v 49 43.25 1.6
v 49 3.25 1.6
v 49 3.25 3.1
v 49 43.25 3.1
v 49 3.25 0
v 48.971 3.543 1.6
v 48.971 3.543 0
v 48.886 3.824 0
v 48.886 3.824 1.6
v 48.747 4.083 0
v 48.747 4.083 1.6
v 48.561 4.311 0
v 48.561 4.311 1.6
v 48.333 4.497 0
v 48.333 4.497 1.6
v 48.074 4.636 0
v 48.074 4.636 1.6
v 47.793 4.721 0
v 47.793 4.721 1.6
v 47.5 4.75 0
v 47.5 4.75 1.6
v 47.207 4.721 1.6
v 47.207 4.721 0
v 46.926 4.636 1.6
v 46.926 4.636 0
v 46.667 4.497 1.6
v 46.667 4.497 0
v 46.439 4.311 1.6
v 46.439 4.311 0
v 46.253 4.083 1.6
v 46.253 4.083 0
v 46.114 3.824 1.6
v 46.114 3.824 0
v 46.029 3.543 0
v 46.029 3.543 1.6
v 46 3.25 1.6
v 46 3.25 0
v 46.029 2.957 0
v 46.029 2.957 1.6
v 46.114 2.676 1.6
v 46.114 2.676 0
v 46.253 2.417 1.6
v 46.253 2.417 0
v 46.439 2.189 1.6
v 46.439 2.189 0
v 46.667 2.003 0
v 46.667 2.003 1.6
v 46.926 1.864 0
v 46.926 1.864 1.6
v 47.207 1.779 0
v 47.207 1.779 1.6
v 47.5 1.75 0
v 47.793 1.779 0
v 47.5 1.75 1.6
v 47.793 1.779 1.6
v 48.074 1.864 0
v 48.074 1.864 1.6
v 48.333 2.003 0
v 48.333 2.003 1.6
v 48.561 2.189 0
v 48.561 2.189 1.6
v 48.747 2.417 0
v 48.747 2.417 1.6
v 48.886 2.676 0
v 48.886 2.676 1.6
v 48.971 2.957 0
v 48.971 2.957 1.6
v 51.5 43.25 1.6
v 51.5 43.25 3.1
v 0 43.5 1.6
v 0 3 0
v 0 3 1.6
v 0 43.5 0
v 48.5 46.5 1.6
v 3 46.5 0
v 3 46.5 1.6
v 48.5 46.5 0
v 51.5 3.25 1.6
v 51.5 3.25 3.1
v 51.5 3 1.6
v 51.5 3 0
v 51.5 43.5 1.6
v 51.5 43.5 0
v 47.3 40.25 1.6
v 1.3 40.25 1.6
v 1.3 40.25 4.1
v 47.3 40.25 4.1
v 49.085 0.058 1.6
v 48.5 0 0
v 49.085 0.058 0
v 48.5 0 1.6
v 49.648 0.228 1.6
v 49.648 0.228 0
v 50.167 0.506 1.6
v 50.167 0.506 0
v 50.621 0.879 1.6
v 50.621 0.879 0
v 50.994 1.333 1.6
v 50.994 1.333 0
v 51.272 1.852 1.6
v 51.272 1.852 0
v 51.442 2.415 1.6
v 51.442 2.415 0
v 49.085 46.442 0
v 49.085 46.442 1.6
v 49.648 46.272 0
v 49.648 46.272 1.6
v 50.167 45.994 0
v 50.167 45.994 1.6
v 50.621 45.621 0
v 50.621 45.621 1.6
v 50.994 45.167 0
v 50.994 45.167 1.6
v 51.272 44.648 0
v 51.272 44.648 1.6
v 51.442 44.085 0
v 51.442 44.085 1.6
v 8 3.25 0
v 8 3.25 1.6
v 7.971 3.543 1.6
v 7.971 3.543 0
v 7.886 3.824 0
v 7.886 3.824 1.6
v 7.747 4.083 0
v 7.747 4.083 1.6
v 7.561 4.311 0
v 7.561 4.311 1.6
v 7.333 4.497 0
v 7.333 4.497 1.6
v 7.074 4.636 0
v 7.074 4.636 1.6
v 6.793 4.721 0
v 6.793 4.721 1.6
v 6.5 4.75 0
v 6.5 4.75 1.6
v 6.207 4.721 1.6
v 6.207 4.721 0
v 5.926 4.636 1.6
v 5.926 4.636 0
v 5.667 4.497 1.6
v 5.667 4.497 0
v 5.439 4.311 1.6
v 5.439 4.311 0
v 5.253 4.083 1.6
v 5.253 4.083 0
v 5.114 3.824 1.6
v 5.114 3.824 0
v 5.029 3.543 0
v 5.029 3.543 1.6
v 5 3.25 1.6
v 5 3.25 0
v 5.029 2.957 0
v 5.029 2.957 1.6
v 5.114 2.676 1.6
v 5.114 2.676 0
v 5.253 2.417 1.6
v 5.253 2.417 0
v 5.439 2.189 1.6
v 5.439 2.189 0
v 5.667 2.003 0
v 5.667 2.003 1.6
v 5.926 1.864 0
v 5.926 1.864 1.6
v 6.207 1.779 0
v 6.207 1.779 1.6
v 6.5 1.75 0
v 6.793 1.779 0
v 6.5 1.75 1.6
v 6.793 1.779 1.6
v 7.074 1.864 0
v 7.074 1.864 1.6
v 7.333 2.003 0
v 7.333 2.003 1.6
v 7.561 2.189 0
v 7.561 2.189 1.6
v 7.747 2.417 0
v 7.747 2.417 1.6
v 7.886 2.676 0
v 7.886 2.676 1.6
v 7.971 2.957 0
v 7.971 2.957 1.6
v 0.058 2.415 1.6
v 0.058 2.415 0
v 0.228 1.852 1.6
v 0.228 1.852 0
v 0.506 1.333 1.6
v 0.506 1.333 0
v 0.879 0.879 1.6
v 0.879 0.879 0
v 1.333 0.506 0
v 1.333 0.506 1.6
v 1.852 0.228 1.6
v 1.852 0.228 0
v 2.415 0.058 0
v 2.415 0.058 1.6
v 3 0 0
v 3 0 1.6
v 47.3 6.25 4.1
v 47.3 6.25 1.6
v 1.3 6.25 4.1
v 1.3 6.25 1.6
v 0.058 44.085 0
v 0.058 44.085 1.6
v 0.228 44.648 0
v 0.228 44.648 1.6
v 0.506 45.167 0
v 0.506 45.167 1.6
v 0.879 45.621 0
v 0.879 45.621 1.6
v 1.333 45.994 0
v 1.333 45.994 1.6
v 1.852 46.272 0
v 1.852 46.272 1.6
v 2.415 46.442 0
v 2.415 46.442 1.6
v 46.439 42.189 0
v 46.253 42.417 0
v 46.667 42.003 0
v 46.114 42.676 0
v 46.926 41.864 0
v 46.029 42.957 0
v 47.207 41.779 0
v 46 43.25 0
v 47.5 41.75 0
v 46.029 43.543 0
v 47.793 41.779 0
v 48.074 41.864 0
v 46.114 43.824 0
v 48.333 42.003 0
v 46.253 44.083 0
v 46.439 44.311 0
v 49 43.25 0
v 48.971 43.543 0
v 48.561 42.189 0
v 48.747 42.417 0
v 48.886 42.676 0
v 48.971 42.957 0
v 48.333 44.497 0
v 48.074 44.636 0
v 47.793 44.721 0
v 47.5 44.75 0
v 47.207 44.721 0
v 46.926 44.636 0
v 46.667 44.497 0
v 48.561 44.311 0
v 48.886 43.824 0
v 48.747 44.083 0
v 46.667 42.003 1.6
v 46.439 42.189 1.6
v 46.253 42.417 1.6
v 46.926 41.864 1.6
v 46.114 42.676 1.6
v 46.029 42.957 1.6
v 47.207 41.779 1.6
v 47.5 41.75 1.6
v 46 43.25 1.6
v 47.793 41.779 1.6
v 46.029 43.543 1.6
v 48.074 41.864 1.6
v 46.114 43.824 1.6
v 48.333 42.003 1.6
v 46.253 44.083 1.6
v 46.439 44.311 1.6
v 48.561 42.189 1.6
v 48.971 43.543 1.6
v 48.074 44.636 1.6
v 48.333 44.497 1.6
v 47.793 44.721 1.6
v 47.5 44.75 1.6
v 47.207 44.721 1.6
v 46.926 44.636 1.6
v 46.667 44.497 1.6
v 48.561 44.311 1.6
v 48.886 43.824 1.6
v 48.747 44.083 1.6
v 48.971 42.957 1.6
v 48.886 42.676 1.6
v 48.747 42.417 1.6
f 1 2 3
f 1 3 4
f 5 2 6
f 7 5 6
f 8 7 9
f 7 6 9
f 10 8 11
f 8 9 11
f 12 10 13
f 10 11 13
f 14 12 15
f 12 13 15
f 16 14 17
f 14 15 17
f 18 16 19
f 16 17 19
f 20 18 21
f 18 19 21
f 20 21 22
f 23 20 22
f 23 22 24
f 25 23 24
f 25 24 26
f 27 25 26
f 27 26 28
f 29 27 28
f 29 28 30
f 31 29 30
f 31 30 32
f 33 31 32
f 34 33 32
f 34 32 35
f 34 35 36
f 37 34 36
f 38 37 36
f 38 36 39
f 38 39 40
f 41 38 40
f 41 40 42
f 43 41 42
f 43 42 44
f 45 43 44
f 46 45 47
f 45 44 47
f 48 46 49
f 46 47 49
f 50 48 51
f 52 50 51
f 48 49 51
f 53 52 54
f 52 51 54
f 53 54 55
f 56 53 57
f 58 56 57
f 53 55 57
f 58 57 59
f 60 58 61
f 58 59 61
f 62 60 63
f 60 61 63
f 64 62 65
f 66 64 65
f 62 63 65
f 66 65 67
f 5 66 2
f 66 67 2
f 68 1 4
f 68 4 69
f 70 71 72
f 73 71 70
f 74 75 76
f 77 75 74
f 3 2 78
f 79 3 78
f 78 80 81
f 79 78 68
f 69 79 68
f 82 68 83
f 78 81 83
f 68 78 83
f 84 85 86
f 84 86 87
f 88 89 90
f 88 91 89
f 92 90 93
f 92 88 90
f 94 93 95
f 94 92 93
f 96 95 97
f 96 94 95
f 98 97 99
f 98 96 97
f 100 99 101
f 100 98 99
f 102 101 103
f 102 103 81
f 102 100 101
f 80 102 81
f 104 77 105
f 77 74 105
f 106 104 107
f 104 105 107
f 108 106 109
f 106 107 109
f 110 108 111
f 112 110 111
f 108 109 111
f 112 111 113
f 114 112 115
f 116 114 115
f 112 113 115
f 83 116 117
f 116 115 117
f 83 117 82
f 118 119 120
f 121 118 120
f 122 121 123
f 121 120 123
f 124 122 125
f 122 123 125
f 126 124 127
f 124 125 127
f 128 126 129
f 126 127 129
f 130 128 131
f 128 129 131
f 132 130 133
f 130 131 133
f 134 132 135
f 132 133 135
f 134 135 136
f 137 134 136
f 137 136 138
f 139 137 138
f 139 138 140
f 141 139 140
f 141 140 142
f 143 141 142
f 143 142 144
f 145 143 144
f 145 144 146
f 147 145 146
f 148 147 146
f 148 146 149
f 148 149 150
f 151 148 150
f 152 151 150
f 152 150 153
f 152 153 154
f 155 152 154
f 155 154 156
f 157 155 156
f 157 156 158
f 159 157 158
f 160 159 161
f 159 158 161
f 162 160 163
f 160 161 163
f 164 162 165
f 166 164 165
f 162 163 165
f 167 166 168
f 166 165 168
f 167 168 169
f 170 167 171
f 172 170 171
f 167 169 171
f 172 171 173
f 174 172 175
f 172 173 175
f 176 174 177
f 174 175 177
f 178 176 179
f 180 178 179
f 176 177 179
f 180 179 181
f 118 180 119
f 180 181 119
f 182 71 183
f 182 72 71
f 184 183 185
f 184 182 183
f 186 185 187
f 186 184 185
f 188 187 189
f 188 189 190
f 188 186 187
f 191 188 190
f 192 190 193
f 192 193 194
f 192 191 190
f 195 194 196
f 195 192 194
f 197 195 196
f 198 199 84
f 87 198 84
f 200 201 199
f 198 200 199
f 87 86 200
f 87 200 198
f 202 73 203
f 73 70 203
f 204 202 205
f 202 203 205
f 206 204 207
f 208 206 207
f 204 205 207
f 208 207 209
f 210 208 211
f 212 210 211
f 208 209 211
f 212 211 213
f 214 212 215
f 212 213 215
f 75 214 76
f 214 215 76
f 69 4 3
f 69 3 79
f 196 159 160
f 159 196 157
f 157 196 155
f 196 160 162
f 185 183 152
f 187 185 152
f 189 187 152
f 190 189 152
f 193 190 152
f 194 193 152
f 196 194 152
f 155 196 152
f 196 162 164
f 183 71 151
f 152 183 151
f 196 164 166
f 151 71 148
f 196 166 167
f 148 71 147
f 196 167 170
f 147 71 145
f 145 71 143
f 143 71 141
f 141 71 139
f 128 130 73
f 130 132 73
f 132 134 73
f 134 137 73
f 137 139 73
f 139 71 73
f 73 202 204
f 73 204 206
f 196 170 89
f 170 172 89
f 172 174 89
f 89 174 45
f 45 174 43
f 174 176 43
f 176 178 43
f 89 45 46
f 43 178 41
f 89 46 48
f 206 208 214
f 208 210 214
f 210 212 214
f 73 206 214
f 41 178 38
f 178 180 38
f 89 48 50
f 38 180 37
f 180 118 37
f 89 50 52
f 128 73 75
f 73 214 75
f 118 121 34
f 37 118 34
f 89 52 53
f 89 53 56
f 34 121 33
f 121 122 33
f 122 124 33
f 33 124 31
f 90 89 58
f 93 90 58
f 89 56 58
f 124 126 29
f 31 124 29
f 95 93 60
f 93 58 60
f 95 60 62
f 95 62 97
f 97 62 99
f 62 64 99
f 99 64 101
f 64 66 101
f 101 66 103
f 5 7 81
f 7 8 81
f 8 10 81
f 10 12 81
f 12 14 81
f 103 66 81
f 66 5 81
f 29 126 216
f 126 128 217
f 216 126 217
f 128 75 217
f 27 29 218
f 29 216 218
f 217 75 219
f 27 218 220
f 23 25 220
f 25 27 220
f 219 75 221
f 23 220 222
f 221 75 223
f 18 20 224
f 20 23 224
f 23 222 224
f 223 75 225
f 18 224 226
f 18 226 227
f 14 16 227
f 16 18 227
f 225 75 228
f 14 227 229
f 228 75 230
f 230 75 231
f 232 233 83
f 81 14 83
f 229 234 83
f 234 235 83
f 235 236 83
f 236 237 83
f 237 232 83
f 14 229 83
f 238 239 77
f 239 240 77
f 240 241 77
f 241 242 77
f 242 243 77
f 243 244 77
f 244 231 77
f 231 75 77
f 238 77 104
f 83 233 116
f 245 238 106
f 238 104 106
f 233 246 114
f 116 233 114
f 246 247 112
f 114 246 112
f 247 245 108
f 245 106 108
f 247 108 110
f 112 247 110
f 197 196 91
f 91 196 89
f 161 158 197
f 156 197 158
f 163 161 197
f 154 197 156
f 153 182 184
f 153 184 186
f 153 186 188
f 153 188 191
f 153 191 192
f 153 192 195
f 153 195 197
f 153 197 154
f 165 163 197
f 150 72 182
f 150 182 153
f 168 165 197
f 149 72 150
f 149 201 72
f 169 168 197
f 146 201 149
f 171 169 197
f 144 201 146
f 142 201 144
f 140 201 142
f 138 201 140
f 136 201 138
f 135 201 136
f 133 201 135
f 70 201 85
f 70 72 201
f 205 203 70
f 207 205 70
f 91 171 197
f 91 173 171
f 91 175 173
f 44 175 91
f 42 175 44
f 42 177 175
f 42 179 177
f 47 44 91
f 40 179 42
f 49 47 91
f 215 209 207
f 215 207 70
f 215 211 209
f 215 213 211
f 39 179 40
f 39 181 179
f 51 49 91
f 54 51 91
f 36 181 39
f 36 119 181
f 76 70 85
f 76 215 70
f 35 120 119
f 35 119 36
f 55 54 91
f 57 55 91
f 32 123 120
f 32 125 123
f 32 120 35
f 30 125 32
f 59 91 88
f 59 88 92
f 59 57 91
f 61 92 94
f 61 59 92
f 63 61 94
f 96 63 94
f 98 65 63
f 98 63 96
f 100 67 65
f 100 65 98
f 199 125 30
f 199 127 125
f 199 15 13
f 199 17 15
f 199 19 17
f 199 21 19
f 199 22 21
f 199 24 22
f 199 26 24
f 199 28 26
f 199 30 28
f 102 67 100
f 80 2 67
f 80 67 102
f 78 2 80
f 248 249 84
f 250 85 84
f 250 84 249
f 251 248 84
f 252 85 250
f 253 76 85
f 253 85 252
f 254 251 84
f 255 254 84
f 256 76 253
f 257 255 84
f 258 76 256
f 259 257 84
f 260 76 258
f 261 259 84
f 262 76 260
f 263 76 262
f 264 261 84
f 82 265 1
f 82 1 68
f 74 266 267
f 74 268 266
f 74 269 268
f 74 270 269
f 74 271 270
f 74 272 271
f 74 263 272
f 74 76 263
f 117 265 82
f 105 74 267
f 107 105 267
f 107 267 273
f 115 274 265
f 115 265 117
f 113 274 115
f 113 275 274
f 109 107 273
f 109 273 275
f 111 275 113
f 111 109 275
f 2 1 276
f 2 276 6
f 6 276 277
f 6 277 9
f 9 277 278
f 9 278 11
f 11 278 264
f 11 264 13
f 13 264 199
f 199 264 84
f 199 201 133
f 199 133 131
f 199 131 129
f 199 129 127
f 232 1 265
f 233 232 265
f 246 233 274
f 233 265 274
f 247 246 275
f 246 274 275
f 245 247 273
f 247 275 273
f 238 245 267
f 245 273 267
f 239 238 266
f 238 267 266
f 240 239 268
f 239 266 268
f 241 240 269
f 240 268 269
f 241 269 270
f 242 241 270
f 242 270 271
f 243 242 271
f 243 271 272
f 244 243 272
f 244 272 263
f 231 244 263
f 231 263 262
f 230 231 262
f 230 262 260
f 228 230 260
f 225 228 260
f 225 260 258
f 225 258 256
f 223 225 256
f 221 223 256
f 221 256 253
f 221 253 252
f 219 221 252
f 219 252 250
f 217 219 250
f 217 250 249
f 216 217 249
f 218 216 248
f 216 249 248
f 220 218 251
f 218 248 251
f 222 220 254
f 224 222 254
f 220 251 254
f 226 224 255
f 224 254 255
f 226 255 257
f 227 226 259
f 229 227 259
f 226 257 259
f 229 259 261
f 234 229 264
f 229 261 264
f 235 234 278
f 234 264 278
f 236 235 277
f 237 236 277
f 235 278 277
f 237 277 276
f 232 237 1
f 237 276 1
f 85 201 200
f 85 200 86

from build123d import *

# Parameters (mm, degrees)
ESQUISSE1_W             = 51.5
ESQUISSE1_H             = 46.5
BOSS_EXTRU_1_DEPTH      = 1.6
ESQUISSE2_W             = 46
ESQUISSE2_H             = 34
BOSS_EXTRU_2_DEPTH      = 2.5
ESQUISSE3_W             = 2.5
ESQUISSE3_H             = 40
BOSS_EXTRU_3_DEPTH      = 1.5
ESQUISSE4_R             = 1.5
ENL_V_MAT_EXTRU_1_DEPTH = 70.431621038
CONG_1_R                = 3


with BuildPart() as part:
    # Esquisse1 → Boss.-Extru.1 (new body)
    with BuildSketch(Plane.XY):
        with Locations((25.75, 23.25)):
            Rectangle(ESQUISSE1_W, ESQUISSE1_H)
    extrude(amount=BOSS_EXTRU_1_DEPTH)

    # Esquisse2 → Boss.-Extru.2 (add)
    with BuildSketch(Plane.XY.offset(1.6)):
        with Locations((24.3, 23.25)):
            Rectangle(ESQUISSE2_W, ESQUISSE2_H)
    extrude(amount=BOSS_EXTRU_2_DEPTH)

    # Esquisse3 → Boss.-Extru.3 (add)
    with BuildSketch(Plane.XY.offset(1.6)):
        with Locations((50.25, 23.25)):
            Rectangle(ESQUISSE3_W, ESQUISSE3_H)
    extrude(amount=BOSS_EXTRU_3_DEPTH)

    # Esquisse4 → Enlèv. mat.-Extru.1 (cut, through all)
    with BuildSketch(Plane.XY.offset(1.6)):
        with Locations((47.5, 3.25)):
            Circle(ESQUISSE4_R)
        with Locations((47.5, 43.25)):
            Circle(ESQUISSE4_R)
        with Locations((6.5, 3.25)):
            Circle(ESQUISSE4_R)
    extrude(amount=-ENL_V_MAT_EXTRU_1_DEPTH, mode=Mode.SUBTRACT)

    # Congé1
    cong_1_edges = [part.edges().sort_by_distance(p)[0] for p in [
        (0, 46.5, 0.8),
        (51.5, 46.5, 0.8),
        (51.5, 0, 0.8),
        (0, 0, 0.8),
    ]]
    fillet(cong_1_edges, radius=CONG_1_R)


solid = part.part
